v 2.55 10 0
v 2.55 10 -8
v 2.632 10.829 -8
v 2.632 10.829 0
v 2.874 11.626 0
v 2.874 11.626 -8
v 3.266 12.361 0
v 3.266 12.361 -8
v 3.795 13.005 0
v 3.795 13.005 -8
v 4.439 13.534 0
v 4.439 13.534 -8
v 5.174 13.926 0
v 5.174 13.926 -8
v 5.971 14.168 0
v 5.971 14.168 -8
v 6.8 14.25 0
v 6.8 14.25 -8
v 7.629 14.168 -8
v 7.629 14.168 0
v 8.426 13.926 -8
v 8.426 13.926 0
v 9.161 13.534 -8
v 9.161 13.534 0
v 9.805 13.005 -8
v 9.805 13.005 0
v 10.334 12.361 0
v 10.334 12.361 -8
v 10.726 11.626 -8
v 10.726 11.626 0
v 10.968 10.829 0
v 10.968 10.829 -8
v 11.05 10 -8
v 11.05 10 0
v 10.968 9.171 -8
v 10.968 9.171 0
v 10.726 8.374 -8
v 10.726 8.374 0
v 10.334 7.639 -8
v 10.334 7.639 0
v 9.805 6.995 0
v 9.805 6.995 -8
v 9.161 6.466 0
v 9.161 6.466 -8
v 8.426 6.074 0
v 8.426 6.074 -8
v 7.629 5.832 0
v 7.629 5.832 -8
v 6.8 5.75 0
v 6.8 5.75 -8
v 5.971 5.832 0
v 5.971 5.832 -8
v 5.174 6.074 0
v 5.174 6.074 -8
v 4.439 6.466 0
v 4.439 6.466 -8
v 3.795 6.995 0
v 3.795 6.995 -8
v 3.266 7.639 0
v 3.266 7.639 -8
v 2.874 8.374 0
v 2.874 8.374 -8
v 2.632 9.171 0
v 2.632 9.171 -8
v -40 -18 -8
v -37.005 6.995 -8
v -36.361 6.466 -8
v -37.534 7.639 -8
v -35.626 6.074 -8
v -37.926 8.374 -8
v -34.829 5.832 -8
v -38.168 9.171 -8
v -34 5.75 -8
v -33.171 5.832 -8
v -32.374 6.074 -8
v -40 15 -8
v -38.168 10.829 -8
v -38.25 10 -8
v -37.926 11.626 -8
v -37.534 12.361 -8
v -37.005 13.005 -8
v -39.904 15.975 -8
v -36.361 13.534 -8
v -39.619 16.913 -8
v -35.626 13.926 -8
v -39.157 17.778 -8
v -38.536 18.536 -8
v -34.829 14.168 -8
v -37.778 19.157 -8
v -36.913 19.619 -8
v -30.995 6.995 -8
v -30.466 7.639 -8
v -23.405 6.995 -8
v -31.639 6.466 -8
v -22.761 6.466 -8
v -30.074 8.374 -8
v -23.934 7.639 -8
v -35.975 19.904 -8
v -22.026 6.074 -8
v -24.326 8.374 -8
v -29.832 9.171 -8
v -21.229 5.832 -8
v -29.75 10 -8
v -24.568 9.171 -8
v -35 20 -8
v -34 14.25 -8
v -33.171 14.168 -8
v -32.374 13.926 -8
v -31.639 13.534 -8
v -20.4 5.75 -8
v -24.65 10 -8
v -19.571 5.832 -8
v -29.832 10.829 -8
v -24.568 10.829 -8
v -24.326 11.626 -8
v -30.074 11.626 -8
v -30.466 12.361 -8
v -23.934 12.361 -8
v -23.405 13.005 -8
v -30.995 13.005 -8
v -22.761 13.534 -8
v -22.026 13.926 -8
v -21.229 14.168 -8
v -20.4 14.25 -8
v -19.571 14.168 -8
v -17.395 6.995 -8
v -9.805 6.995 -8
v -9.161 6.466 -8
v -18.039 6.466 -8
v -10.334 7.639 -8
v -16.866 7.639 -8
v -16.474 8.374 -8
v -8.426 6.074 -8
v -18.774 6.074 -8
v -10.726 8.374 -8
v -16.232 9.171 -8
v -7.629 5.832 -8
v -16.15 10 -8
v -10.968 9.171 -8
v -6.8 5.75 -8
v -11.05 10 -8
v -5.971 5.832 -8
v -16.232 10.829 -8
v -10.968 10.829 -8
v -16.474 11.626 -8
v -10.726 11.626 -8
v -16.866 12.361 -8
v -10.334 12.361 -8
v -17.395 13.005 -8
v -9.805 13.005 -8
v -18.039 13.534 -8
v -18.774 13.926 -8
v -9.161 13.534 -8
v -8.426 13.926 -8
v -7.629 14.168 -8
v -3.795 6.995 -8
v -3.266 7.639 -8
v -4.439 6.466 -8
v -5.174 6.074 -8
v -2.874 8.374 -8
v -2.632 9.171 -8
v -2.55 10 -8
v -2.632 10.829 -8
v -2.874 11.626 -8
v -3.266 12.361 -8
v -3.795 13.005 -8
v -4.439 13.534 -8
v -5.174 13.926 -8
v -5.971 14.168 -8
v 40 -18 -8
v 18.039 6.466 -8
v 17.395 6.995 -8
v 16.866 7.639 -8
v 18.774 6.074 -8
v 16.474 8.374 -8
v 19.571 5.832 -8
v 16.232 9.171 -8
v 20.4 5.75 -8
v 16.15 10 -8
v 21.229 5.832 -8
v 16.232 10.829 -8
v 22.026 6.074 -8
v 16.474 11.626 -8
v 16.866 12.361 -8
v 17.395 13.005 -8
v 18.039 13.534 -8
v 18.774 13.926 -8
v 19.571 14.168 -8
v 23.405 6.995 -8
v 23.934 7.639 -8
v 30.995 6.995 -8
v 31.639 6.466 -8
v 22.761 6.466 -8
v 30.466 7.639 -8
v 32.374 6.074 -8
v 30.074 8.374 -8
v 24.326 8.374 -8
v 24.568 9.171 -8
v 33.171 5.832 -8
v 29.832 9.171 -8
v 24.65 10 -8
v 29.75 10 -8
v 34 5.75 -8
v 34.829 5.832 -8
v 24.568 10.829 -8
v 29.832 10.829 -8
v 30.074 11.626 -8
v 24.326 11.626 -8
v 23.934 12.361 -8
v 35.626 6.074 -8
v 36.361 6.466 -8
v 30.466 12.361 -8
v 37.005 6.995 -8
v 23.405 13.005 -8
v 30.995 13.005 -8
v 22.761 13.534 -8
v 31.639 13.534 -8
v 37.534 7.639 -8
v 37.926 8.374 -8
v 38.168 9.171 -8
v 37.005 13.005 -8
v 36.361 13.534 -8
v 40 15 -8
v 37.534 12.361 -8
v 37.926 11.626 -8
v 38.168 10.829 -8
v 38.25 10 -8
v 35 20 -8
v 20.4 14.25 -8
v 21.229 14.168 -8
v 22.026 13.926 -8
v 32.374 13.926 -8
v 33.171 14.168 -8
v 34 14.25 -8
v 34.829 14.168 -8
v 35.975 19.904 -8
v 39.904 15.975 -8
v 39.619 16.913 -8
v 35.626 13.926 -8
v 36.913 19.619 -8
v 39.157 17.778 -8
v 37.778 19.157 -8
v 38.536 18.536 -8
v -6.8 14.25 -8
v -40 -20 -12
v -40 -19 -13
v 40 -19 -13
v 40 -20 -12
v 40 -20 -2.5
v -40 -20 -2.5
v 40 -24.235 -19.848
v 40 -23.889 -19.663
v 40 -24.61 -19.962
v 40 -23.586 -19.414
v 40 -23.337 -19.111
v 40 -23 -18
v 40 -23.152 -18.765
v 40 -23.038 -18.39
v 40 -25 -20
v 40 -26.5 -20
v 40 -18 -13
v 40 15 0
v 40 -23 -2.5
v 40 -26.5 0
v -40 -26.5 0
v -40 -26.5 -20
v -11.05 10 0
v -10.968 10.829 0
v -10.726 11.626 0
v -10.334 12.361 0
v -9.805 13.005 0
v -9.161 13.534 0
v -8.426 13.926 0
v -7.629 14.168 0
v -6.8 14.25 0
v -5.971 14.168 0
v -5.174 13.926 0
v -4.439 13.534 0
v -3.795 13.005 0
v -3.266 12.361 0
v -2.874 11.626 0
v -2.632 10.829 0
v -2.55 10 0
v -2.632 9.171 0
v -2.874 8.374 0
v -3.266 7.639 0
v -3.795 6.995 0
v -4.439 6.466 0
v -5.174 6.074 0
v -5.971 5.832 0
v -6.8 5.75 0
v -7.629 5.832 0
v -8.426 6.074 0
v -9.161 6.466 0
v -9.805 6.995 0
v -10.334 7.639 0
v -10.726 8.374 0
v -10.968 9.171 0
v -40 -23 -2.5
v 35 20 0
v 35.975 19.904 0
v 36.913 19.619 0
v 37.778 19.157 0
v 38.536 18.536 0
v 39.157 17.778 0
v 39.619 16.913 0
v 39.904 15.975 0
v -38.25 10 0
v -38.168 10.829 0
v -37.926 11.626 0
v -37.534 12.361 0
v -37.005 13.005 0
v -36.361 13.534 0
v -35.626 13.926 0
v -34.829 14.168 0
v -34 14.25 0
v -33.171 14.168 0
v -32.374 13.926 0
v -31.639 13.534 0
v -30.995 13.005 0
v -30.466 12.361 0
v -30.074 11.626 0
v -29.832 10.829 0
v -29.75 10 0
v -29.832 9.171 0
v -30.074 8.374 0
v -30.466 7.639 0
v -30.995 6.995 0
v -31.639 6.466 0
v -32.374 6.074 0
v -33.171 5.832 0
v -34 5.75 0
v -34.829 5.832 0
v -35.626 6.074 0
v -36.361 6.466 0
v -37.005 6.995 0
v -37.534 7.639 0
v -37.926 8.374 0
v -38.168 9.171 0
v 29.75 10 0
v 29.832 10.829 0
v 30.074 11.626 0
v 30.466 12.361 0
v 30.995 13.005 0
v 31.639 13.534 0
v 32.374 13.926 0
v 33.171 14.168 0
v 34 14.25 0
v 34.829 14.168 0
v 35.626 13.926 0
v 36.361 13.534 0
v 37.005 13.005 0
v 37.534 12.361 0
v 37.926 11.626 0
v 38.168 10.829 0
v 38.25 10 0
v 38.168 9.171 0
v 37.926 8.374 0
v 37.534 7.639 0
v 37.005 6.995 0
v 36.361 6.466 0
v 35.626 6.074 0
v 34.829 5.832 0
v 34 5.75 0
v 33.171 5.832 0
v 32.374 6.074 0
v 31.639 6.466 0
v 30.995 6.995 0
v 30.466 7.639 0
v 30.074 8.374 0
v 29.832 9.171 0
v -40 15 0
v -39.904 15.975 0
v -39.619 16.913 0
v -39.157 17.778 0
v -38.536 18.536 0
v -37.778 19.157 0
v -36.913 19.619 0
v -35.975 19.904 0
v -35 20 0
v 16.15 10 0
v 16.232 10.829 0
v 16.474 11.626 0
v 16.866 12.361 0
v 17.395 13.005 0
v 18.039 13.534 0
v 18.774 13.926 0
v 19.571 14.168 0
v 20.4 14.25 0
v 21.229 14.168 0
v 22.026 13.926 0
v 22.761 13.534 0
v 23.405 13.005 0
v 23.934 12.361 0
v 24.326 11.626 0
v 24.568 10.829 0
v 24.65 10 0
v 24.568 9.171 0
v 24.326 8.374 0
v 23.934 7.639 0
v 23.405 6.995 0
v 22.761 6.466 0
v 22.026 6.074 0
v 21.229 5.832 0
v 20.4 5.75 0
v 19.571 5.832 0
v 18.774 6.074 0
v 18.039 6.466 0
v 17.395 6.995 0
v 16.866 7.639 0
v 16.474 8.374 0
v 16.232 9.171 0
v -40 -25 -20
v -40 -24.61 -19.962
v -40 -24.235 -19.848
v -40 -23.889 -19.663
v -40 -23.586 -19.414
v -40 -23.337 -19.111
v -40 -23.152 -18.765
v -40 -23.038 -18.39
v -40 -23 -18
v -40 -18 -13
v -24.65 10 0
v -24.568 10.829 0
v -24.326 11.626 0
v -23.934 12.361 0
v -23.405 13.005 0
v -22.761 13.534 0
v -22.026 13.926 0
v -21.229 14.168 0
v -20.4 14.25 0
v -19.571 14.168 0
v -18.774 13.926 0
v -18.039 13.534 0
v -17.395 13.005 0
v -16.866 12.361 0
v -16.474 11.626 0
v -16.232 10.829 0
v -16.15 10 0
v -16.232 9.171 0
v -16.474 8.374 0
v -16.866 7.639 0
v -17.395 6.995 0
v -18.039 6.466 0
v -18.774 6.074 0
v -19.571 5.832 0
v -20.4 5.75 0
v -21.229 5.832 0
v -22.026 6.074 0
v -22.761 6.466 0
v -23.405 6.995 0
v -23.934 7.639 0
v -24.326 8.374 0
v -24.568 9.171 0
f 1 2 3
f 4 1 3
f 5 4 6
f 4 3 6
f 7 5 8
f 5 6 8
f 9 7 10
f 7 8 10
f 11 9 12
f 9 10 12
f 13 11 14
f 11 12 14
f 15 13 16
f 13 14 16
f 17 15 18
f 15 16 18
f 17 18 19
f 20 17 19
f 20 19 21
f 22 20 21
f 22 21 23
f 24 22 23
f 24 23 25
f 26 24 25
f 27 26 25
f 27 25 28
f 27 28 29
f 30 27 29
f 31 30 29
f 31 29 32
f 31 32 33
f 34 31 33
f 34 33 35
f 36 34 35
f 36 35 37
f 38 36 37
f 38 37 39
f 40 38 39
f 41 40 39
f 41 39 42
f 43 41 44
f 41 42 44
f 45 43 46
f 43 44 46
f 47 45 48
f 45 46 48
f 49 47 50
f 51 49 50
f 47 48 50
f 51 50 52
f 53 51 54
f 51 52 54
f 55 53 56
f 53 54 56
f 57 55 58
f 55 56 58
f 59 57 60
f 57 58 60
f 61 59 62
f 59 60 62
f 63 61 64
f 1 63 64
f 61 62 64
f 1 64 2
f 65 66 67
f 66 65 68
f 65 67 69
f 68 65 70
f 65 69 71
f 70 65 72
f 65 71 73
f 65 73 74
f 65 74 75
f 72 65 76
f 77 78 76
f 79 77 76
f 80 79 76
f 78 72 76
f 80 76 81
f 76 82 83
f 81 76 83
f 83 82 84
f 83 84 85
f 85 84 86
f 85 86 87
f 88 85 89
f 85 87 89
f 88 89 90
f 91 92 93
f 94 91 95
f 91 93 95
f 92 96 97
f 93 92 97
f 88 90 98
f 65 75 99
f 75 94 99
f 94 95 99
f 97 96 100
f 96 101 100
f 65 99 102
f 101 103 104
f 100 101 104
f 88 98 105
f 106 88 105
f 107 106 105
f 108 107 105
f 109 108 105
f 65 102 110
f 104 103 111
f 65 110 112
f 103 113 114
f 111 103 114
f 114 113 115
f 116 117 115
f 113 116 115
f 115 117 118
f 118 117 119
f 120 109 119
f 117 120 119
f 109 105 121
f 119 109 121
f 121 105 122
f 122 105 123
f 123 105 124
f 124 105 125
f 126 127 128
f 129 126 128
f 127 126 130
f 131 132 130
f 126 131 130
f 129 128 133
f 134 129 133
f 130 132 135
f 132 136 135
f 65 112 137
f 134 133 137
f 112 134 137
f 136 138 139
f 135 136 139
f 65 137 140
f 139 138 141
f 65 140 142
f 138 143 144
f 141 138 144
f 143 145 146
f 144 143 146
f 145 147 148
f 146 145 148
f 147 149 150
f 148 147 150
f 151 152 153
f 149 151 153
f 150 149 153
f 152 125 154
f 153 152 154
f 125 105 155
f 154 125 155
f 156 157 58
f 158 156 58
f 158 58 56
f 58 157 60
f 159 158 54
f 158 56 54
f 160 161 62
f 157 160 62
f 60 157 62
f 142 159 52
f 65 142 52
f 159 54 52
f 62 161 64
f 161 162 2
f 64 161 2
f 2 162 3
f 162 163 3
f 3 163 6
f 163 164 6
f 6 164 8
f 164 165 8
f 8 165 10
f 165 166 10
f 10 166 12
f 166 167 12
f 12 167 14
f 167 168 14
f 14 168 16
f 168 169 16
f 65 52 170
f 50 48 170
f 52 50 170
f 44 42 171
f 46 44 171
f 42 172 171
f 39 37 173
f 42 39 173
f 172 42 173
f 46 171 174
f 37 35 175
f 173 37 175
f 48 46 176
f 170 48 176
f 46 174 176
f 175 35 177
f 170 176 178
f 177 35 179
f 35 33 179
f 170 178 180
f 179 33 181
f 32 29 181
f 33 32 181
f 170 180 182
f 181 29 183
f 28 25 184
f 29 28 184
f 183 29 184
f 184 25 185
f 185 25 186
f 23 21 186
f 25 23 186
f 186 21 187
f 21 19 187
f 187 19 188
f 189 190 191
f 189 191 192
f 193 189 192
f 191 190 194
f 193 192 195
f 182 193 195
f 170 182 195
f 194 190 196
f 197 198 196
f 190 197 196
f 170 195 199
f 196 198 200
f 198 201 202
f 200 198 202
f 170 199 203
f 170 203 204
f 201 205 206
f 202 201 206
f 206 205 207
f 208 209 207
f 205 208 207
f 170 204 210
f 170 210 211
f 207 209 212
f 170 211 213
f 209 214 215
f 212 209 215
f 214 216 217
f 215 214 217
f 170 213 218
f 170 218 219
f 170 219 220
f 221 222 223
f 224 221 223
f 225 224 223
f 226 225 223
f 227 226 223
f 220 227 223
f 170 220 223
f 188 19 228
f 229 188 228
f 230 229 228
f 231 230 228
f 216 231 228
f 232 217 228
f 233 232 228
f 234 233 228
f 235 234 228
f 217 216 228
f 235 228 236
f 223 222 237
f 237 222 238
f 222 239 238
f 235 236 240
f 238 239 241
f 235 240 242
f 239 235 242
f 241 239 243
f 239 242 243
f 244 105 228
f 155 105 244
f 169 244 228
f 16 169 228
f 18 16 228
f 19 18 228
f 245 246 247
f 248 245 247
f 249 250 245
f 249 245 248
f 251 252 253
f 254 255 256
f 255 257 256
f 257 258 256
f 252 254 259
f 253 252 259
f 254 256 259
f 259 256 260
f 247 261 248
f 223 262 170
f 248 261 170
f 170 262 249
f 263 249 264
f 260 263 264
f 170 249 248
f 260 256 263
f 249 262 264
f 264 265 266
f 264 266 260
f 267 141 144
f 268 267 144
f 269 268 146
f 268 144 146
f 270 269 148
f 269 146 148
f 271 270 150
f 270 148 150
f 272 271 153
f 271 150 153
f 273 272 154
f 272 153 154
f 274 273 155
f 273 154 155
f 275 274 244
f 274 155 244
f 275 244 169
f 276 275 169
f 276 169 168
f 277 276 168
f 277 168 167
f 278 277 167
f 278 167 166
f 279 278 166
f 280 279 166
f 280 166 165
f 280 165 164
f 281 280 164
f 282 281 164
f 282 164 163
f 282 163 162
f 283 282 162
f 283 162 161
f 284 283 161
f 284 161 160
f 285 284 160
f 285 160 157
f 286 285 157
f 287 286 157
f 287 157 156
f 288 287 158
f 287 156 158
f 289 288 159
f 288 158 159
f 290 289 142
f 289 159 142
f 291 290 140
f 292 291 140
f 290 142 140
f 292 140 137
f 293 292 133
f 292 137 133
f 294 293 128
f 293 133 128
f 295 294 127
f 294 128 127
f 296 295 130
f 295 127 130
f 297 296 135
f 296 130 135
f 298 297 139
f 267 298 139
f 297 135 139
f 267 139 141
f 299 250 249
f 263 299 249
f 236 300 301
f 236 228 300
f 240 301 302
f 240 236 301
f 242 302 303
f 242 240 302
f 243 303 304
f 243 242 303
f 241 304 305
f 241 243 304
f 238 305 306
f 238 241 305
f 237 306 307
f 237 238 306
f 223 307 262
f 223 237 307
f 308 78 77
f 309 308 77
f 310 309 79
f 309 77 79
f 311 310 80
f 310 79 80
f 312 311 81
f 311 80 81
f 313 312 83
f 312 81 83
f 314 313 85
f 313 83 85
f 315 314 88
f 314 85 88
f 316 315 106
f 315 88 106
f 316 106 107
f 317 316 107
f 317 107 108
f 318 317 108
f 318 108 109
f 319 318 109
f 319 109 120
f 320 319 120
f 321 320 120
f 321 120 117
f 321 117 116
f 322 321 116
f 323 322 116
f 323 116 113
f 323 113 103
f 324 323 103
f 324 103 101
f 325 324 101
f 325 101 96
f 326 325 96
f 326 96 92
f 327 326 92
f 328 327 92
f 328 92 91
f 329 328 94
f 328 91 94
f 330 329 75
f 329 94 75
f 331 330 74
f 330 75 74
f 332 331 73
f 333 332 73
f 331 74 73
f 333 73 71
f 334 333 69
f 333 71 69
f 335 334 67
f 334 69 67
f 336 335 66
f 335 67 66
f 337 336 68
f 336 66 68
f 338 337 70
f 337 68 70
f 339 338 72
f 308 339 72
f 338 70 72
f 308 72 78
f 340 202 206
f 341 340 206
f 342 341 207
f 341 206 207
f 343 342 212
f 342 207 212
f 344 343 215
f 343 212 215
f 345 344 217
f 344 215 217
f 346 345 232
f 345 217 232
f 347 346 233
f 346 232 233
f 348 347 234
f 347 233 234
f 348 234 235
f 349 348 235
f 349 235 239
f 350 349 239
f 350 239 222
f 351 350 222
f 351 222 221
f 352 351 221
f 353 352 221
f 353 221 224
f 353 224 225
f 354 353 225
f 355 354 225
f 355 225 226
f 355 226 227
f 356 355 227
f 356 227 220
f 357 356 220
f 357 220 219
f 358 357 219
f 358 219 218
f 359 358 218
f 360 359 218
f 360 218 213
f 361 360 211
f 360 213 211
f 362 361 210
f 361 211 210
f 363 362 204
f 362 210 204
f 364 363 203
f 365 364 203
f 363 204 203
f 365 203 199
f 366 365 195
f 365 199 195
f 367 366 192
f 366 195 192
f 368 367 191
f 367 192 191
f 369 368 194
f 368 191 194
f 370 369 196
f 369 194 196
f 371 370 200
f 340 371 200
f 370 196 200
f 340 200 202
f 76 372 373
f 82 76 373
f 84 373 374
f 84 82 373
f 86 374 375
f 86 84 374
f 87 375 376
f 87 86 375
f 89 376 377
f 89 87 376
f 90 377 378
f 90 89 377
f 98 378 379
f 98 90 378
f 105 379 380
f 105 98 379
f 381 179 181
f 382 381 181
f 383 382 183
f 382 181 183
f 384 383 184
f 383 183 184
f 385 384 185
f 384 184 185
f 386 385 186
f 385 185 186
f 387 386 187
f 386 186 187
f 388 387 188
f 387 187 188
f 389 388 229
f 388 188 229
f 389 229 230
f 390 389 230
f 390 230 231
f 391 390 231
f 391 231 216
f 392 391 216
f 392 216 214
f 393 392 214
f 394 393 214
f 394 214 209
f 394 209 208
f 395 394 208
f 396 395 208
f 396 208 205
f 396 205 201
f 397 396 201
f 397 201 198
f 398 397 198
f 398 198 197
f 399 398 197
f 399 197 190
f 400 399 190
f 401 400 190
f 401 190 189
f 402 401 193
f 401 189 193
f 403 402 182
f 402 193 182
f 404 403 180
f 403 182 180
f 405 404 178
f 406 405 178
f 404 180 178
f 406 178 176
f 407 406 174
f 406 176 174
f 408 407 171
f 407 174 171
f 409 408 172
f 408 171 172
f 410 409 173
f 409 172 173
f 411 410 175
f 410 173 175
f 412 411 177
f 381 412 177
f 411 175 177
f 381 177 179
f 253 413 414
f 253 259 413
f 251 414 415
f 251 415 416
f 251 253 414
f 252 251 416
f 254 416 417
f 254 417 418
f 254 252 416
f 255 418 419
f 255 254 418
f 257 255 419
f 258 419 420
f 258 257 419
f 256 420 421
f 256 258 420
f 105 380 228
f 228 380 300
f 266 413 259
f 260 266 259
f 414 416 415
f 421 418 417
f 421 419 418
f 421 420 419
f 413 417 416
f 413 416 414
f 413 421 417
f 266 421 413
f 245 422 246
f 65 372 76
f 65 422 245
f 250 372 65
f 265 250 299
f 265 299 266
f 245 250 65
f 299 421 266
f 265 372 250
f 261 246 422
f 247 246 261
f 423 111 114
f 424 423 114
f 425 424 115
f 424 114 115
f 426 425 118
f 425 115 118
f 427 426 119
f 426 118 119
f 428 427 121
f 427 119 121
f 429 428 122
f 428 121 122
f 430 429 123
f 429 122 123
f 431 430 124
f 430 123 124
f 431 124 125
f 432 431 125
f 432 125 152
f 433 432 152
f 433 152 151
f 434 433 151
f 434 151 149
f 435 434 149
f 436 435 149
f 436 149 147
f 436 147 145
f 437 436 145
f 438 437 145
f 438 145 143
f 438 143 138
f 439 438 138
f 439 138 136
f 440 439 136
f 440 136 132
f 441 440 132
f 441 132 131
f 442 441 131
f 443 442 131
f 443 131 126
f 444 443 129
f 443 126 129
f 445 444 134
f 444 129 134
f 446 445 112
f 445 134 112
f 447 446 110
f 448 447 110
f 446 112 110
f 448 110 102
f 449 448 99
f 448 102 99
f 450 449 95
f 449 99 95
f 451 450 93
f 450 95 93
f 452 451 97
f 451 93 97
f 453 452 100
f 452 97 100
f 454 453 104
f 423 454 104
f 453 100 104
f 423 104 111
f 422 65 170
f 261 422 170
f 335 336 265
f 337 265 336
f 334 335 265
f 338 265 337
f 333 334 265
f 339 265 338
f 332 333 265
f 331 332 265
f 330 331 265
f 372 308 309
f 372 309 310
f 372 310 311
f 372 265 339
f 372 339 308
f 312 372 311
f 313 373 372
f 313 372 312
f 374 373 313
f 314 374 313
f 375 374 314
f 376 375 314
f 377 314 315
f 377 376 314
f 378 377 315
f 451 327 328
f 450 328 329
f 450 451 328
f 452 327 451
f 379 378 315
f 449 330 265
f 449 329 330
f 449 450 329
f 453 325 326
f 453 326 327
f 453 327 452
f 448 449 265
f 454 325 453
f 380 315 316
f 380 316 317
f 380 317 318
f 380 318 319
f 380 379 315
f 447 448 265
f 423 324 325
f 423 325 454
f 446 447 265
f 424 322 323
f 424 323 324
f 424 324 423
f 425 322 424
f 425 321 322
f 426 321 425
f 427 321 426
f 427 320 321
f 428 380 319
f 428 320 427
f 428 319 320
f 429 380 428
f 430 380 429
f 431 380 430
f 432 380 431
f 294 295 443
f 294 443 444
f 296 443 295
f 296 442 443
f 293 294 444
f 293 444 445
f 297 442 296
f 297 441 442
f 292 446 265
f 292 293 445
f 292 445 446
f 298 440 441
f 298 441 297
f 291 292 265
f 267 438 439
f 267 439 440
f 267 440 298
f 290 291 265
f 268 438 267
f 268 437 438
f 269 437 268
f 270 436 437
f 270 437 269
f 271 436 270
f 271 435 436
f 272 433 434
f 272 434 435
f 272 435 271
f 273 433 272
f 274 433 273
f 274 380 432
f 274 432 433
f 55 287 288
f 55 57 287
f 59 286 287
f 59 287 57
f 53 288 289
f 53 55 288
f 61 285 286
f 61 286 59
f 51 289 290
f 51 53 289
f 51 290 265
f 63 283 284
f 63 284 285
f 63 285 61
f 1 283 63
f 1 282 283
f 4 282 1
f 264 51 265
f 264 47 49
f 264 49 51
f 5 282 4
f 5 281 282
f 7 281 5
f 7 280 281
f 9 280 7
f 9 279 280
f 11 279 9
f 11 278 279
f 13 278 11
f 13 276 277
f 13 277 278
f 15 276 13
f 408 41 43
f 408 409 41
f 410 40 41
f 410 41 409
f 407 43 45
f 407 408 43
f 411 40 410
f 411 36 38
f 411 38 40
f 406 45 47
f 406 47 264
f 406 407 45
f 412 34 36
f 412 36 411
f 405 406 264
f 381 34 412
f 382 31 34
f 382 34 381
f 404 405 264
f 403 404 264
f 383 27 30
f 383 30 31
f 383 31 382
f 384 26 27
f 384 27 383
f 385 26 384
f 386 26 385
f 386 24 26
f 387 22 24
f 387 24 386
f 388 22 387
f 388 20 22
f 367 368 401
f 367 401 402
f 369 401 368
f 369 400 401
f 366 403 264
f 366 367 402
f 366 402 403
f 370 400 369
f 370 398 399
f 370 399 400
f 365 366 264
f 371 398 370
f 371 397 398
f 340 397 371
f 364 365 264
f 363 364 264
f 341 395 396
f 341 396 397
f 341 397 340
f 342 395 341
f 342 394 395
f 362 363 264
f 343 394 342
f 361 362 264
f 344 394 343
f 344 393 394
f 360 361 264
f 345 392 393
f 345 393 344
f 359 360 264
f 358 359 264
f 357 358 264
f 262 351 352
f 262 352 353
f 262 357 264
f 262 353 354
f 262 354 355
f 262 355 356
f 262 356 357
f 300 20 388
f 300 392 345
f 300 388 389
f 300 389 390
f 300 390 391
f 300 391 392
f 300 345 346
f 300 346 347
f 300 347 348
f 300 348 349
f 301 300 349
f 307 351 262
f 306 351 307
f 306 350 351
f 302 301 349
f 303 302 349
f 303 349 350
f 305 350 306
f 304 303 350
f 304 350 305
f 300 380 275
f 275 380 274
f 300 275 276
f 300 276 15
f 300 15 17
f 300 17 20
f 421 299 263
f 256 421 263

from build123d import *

# Parameters (mm, degrees)
F0_W     = 80
F0_H     = 40
F1_DEPTH = 8
F0_H_2   = 3
F2_DEPTH = 2.5
F0_H_3   = 3.5
F3_DEPTH = 20
F5_D     = 8.5
F6_R     = 2
F7_R     = 5
F8_W     = 80
F8_H     = 2
F9_DEPTH = 5
F10_SIZE = 1


with BuildPart() as f1:
    # F0 (on Top) → F1 (new body)
    with BuildSketch(Plane.XY):
        Rectangle(F0_W, F0_H)
    extrude(amount=-F1_DEPTH)

    # F0 (on Top) → F2 (join)
    with BuildSketch(Plane.XY):
        with Locations((0, -21.5)):
            Rectangle(F0_W, F0_H_2)
    extrude(amount=-F2_DEPTH)

    # F0 (on Top) → F3 (join)
    with BuildSketch(Plane.XY):
        with Locations((0, -24.75)):
            Rectangle(F0_W, F0_H_3)
    extrude(amount=-F3_DEPTH)

    # F5 (through all)
    with Locations(Plane.XY):
        with Locations((-34, 10), (34, 10), (6.8, 10), (20.4, 10), (-20.4, 10), (-6.8, 10)):
            Hole(F5_D / 2)

    # F6
    f6_edges = [f1.edges().sort_by_distance(p)[0] for p in [
        (0, -23, -20),
    ]]
    fillet(f6_edges, radius=F6_R)

    # F7
    f7_edges = [f1.edges().sort_by_distance(p)[0] for p in [
        (40, 20, -4),
        (-40, 20, -4),
    ]]
    fillet(f7_edges, radius=F7_R)

    # F8 (on face) → F9 (join)
    with BuildSketch(Plane(origin=(0, 0, -8), x_dir=(1, 0, 0), z_dir=(0, 0, -1))):
        with Locations((0, 19)):
            Rectangle(F8_W, F8_H)
    extrude(amount=F9_DEPTH)

    # F10
    f10_edges = [f1.edges().sort_by_distance(p)[0] for p in [
        (0, -20, -13),
    ]]
    chamfer(f10_edges, length=F10_SIZE)


solid = f1.part
